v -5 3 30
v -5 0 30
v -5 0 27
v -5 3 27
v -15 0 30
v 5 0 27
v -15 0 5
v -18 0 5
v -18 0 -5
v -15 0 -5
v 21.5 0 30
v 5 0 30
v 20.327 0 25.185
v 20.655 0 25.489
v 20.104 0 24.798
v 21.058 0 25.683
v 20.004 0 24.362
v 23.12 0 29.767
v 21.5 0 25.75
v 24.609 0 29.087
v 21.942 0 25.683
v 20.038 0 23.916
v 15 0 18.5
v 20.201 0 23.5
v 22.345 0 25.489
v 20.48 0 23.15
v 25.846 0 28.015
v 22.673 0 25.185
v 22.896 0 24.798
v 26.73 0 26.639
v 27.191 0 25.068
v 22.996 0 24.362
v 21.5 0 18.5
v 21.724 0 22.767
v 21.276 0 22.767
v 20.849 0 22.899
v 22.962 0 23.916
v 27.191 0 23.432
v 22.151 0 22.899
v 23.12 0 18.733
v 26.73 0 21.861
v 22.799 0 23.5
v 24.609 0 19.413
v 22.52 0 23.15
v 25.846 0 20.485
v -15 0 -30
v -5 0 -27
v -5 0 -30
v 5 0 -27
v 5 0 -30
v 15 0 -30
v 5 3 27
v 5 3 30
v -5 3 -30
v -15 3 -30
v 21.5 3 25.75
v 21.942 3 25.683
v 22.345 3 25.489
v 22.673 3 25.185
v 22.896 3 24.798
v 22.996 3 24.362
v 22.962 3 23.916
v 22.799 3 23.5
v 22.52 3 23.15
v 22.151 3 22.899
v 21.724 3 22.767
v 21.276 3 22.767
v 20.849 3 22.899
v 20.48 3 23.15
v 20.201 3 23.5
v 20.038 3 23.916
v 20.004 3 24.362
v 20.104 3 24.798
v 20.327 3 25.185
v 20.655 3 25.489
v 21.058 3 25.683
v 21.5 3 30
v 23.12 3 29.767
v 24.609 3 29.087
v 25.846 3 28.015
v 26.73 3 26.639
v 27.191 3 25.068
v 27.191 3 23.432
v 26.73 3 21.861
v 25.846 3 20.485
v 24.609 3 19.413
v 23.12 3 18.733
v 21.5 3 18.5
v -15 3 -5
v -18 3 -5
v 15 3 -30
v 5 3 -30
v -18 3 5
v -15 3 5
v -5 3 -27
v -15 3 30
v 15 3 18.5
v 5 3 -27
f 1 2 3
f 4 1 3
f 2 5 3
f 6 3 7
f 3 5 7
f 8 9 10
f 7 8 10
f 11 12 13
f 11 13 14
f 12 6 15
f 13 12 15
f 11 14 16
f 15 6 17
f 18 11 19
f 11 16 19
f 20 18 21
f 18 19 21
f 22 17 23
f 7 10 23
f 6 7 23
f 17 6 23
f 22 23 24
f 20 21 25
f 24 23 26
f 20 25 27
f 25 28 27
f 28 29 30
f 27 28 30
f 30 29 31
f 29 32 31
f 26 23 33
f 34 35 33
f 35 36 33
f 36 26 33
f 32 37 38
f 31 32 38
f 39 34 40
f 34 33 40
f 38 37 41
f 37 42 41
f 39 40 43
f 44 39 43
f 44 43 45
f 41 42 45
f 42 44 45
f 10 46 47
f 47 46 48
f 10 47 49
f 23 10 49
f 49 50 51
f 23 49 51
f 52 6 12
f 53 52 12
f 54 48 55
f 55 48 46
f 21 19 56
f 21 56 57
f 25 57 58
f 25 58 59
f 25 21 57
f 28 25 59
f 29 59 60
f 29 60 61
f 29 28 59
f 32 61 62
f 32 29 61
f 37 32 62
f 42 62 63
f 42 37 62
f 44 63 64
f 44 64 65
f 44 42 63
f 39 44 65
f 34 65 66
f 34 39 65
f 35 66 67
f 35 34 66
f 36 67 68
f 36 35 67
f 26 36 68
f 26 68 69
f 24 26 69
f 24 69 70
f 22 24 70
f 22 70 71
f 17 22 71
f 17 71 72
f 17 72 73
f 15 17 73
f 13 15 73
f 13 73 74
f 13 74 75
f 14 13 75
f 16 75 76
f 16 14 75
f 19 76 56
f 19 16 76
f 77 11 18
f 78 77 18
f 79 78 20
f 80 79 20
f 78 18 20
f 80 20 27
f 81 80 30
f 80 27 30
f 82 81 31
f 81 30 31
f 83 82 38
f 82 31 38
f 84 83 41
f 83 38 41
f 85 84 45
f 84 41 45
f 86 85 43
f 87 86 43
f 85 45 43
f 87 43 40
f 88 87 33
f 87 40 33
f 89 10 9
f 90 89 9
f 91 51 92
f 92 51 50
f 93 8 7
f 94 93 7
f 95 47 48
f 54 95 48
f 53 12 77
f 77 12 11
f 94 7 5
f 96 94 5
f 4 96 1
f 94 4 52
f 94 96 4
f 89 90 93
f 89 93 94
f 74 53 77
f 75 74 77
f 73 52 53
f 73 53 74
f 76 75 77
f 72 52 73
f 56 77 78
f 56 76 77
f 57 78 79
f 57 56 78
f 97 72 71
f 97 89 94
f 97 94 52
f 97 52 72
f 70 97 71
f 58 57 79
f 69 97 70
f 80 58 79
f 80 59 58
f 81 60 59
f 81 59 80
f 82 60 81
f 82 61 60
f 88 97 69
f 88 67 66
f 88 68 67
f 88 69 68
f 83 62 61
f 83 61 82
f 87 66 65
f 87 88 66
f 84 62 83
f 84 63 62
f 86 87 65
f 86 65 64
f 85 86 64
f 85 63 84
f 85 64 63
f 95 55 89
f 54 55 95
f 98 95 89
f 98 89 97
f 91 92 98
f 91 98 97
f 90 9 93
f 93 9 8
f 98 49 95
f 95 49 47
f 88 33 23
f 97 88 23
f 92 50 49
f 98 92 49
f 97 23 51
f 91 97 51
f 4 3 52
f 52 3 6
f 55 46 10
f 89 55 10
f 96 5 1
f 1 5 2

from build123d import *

# Parameters (mm, degrees)
SKETCH1_R           = 1.5
BOSS_EXTRUDE1_DEPTH = 3


with BuildPart() as part:
    # Sketch1 → Boss-Extrude1 (new body)
    with BuildSketch(Plane(origin=(0, 0, 0), x_dir=(1, 0, 0), z_dir=(0, 1, 0))):
        with BuildLine():
            Line((21.5, -18.5), (15, -18.5))
            Line((15, -18.5), (15, -5))
            Line((15, -5), (15, 30))
            Line((15, 30), (5, 30))
            Line((5, 30), (5, 27))
            Line((5, 27), (-5, 27))
            Line((-5, 27), (-5, 30))
            Line((-5, 30), (-15, 30))
            Line((-15, 30), (-15, 5))
            Line((-15, 5), (-18, 5))
            Line((-18, 5), (-18, -5))
            Line((-18, -5), (-15, -5))
            Line((-15, -5), (-15, -30))
            Line((-15, -30), (-5, -30))
            Line((-5, -30), (-5, -27))
            Line((-5, -27), (5, -27))
            Line((5, -27), (5, -30))
            Line((5, -30), (15, -30))
            Line((15, -30), (21.5, -30))
            ThreePointArc((21.5, -30), (27.25, -24.25), (21.5, -18.5))
        make_face()
        with Locations(Location((21.5, -24.25, 0), (0, 0, 270))):
            Circle(SKETCH1_R, mode=Mode.SUBTRACT)
    extrude(amount=BOSS_EXTRUDE1_DEPTH)


solid = part.part
